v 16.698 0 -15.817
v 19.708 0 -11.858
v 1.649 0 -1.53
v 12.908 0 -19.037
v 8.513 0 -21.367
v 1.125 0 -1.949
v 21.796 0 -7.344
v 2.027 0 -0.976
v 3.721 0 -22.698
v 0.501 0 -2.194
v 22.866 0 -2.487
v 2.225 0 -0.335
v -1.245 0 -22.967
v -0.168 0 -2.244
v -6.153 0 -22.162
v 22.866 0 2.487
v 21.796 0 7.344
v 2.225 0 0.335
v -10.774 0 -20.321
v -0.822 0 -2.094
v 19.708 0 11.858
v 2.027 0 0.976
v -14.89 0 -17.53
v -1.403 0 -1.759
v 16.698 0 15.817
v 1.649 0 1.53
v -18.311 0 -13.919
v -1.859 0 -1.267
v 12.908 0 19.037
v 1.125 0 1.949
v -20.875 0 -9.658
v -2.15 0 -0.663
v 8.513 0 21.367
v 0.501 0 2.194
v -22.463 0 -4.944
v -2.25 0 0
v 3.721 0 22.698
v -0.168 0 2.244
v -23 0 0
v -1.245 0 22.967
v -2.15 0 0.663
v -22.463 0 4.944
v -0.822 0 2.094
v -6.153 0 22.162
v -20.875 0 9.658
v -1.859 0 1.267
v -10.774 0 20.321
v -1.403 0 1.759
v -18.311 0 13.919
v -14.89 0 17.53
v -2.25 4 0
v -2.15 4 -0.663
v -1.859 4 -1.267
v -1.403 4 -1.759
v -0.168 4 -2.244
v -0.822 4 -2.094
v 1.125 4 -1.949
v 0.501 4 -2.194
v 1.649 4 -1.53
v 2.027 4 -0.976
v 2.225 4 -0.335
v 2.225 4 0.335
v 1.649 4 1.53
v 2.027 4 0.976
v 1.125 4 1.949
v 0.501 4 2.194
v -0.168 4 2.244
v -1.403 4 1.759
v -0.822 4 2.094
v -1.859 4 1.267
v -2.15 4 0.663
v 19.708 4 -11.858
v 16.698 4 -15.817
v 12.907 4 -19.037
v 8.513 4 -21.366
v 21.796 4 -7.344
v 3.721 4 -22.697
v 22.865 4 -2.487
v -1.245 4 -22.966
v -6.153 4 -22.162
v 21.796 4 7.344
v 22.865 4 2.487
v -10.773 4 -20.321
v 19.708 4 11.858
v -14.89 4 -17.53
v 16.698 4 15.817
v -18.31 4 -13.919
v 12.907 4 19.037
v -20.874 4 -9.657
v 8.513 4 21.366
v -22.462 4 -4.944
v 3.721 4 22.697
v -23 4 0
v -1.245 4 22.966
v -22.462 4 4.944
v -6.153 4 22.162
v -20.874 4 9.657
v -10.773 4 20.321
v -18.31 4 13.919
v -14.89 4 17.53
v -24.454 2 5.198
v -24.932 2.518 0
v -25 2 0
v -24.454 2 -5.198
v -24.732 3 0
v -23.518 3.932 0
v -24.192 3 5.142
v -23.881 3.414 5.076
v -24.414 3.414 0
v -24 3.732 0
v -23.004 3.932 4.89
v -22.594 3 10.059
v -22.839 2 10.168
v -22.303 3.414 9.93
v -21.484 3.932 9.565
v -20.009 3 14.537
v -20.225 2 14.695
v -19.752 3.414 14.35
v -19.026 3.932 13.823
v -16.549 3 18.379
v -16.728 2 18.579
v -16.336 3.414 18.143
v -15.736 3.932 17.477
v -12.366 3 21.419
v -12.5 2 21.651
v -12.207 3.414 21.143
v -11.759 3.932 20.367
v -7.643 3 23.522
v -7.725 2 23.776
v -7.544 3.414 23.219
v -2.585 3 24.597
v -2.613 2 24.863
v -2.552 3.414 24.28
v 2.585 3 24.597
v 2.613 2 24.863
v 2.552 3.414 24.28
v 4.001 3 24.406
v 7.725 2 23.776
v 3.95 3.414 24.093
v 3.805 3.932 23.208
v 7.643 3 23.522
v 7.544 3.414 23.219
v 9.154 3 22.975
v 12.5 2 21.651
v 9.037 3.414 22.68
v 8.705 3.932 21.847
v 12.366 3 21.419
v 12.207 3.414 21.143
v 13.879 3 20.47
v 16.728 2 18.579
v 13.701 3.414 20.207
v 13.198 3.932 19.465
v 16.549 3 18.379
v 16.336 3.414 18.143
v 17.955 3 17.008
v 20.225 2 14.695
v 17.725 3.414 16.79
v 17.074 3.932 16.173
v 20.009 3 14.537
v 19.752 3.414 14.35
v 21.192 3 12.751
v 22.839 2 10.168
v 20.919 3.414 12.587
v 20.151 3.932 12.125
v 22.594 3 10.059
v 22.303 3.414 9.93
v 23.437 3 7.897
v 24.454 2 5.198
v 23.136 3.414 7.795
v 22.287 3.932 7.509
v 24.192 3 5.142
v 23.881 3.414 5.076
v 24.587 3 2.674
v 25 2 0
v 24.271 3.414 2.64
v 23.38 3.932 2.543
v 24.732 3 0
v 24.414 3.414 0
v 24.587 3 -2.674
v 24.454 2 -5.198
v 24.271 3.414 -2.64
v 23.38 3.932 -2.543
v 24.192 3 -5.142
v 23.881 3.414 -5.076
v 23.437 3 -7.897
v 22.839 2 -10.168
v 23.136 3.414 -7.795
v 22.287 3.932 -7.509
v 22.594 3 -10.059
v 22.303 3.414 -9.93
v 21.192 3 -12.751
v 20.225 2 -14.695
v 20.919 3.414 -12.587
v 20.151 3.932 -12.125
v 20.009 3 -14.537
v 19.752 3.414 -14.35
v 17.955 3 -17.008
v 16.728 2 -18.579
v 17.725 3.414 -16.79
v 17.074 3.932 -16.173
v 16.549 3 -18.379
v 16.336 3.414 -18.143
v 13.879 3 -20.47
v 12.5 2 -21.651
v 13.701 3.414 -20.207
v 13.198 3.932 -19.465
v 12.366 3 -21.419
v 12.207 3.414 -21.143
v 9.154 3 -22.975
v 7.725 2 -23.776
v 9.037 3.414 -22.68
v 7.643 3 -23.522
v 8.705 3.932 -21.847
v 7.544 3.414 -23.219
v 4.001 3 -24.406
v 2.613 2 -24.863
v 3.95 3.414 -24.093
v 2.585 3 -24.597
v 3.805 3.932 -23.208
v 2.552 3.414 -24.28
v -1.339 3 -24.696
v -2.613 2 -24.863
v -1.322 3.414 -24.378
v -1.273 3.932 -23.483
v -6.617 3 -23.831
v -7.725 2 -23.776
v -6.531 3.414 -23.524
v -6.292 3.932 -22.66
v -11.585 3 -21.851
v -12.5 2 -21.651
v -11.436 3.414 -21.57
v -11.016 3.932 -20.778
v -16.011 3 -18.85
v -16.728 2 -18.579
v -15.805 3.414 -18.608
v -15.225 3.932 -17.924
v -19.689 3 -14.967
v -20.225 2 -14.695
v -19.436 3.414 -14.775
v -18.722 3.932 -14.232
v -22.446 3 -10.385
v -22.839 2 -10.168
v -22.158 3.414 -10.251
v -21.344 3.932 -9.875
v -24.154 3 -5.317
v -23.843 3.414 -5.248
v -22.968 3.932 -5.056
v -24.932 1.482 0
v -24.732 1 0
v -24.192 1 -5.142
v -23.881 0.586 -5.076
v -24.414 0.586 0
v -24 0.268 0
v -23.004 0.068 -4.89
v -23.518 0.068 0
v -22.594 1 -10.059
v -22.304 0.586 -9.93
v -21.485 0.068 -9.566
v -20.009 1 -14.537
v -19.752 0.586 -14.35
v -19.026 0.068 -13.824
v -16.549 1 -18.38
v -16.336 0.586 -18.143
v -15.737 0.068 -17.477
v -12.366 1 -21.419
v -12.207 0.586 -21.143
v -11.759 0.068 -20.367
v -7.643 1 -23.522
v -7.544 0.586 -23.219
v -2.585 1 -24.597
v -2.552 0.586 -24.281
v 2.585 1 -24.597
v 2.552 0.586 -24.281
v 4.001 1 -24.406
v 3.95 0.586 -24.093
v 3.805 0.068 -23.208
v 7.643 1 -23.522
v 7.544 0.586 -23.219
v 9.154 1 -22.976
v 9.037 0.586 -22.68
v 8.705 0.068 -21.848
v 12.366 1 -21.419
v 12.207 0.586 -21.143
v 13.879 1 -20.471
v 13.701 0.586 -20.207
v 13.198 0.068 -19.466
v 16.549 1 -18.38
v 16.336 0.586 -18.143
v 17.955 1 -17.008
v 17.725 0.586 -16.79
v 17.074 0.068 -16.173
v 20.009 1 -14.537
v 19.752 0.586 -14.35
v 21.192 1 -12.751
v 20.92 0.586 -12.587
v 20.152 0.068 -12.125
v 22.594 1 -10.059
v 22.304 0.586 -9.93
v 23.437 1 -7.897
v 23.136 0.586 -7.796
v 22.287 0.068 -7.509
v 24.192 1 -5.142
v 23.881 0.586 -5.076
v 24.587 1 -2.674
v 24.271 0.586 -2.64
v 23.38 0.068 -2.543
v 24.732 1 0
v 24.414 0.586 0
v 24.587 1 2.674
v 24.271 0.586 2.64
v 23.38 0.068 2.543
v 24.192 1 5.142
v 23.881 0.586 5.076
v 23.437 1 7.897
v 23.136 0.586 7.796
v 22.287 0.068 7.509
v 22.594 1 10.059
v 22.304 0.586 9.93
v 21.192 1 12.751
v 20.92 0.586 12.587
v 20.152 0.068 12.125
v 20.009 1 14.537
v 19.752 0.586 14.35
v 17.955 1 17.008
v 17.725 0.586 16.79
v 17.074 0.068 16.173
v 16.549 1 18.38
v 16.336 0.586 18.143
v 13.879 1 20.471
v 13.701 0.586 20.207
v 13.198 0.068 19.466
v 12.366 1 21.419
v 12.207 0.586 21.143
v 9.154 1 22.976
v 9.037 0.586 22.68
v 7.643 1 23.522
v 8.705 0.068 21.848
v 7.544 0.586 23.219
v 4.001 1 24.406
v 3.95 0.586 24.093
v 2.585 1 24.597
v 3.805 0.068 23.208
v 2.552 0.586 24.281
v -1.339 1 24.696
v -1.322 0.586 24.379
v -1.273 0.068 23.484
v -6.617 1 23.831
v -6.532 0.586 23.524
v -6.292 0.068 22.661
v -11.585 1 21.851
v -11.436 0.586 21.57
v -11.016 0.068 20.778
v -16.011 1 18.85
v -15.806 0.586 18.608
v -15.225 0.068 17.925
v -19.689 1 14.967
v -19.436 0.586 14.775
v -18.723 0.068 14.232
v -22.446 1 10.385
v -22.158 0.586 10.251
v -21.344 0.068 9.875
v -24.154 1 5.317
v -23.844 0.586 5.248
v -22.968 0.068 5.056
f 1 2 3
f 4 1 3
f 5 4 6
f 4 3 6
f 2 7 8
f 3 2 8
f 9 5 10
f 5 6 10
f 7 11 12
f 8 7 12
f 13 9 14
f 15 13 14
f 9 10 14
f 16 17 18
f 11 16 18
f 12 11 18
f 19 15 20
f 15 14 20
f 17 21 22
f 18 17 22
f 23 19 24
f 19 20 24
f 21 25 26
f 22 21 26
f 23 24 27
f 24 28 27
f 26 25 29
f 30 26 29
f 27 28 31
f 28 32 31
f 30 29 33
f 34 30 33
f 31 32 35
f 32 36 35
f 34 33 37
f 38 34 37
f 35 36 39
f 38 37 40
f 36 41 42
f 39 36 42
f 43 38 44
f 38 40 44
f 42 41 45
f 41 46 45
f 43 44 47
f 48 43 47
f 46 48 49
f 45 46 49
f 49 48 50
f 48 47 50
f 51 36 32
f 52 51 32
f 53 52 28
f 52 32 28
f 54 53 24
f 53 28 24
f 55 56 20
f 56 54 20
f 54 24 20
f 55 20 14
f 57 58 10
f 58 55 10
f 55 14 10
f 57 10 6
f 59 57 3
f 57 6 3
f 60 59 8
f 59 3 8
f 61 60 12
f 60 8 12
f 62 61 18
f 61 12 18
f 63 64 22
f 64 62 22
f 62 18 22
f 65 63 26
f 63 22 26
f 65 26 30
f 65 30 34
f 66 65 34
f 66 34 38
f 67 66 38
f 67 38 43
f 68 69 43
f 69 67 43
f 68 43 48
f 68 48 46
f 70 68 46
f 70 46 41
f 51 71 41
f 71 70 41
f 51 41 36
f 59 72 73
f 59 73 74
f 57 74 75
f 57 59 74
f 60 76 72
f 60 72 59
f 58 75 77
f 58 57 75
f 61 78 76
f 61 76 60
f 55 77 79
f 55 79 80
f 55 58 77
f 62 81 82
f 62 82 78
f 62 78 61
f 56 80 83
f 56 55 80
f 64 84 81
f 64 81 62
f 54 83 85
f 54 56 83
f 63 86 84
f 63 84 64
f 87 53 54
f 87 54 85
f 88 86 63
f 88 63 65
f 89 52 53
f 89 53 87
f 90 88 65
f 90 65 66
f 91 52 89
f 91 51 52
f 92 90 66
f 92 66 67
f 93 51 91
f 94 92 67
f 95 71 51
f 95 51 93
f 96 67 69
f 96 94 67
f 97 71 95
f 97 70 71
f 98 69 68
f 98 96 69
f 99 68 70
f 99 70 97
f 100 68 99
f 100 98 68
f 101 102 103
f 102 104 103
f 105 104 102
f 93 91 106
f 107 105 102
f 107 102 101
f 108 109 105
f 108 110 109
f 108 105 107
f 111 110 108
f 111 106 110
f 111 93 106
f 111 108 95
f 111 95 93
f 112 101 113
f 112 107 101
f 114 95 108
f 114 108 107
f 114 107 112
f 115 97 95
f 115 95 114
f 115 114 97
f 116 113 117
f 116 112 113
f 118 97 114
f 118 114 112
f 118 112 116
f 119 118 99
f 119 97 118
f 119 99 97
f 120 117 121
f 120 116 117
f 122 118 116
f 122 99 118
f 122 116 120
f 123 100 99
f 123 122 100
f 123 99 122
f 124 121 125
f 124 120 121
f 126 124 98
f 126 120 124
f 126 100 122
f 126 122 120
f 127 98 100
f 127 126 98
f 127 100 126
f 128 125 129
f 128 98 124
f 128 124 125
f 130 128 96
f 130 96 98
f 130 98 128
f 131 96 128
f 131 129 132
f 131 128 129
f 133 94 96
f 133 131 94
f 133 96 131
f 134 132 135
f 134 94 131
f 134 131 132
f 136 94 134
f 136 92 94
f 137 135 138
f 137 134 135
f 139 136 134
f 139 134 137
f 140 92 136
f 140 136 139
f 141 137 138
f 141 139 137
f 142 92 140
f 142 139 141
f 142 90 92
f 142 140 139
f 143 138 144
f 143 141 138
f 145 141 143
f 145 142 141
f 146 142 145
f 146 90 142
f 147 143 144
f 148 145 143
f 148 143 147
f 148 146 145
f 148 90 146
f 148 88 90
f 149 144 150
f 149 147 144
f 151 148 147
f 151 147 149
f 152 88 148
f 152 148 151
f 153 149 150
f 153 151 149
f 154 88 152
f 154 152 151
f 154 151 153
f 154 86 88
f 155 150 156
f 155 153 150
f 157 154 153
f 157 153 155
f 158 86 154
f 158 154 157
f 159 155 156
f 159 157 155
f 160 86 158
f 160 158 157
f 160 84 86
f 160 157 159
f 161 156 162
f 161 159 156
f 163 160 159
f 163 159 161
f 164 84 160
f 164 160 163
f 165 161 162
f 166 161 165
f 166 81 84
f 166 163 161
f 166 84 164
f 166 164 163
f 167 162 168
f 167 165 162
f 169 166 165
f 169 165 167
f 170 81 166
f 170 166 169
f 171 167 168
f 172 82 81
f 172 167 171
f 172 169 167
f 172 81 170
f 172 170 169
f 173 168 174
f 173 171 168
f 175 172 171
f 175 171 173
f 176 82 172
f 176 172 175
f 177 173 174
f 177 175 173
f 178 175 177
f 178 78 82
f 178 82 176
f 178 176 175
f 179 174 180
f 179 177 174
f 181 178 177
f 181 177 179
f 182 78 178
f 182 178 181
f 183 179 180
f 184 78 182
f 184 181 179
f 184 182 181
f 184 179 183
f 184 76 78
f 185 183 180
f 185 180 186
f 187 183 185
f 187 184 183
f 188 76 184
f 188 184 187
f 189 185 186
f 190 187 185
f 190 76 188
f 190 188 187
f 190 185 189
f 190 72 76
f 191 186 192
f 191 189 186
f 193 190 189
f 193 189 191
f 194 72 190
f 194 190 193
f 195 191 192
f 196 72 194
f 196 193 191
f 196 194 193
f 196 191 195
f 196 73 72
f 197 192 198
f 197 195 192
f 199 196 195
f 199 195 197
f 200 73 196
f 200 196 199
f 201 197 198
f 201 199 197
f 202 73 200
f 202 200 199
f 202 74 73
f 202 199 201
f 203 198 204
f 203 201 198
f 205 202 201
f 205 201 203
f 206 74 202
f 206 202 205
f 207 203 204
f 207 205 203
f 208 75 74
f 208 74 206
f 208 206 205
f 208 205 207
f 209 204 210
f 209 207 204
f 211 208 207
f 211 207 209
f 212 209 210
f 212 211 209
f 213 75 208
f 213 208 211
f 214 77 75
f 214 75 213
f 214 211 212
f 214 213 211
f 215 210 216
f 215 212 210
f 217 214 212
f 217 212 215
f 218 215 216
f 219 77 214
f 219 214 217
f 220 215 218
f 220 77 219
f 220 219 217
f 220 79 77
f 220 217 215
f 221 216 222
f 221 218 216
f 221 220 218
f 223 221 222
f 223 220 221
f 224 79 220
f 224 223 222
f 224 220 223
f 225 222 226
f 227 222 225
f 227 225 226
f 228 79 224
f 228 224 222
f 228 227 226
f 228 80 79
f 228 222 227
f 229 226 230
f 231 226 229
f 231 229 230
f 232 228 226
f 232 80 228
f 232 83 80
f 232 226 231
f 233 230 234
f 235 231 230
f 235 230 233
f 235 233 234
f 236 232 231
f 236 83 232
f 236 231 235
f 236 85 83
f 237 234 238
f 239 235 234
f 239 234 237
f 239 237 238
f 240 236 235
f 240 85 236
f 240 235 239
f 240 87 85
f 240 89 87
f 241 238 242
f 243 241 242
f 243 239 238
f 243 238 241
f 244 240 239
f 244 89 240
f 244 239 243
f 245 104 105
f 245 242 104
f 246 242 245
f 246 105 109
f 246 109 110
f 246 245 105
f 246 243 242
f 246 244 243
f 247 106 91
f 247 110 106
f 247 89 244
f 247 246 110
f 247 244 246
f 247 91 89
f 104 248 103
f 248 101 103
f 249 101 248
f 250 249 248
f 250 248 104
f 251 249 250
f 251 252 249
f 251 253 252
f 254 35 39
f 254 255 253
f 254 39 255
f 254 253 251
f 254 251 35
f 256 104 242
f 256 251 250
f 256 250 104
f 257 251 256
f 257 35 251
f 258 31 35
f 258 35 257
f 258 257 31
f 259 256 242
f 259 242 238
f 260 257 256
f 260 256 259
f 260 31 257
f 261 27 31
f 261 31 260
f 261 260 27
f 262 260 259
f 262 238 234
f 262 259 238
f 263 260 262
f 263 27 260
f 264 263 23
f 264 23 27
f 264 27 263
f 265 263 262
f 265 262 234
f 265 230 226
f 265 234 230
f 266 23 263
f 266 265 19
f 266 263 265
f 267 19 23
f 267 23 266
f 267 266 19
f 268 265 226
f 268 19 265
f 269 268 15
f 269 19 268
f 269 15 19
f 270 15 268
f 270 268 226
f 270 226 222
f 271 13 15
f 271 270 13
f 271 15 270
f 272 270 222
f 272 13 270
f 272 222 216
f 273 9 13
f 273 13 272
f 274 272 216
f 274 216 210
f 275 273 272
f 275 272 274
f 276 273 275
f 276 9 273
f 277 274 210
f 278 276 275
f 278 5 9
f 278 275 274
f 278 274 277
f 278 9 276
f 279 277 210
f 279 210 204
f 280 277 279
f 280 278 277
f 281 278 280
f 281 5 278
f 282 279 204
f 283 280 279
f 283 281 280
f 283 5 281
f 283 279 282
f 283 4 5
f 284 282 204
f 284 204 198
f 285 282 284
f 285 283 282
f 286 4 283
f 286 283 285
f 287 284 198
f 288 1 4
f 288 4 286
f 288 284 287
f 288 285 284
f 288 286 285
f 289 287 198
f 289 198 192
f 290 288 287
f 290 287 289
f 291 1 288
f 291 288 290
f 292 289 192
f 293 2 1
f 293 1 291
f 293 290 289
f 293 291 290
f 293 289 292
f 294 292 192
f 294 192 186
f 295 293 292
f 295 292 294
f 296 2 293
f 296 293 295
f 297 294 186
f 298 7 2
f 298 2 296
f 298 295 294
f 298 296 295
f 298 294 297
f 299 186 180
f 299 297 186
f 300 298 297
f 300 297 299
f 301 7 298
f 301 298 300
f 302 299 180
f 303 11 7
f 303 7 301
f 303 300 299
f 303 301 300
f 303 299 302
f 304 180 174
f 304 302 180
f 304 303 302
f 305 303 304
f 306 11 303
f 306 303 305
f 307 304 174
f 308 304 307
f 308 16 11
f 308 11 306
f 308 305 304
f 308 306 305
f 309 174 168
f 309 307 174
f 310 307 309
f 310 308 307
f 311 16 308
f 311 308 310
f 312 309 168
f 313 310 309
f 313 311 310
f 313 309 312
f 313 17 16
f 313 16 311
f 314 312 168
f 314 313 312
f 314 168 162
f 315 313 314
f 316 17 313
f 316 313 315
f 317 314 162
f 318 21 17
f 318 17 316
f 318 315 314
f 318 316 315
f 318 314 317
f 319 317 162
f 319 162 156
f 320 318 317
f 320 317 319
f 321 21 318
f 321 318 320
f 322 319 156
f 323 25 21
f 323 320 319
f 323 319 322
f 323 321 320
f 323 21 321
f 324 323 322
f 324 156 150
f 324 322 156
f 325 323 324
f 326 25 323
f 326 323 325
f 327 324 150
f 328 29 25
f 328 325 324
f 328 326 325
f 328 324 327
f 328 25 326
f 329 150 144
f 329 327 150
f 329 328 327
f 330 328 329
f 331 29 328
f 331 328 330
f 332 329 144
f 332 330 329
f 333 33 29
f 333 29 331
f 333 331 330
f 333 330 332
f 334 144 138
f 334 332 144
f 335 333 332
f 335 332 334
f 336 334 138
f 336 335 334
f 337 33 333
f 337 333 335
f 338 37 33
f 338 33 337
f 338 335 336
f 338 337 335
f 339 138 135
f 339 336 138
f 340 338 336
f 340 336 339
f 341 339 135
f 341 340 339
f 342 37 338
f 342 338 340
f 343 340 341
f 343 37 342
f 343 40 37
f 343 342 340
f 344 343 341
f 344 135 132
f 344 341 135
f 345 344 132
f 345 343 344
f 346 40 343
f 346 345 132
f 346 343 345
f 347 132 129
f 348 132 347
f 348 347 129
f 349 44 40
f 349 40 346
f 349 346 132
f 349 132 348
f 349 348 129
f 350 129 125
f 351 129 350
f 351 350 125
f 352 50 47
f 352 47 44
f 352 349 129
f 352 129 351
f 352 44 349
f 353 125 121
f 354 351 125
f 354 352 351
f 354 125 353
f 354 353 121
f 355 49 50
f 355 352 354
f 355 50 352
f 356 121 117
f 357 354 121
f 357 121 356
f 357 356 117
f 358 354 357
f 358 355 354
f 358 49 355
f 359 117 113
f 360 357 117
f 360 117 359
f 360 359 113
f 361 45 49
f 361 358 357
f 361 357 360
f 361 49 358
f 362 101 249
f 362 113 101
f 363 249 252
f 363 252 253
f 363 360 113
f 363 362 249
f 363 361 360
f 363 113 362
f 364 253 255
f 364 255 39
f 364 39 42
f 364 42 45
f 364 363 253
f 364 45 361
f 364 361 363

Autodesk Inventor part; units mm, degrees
ref_plane "YZ Plane" through (0, 0, 0) normal (1, 0, 0) x (0, 1, 0)
ref_plane "XZ Plane" through (0, 0, 0) normal (0, 1, 0) x (-1, 0, 0)
ref_plane "XY Plane" through (0, 0, 0) normal (0, 0, 1) x (1, 0, 0)
sketch "Sketch1" plane through (0, 0, 0) normal (0, 1, 0) x (-1, 0, 0)
  circle A0 centre (0, 0) radius 25
  circle A1 centre (0, 0) radius 2.25
  dimension "d0" = 50
  dimension "d1" = 4.5
extrude "Extrusion1" add sketch "Sketch1" along normal blind 4
fillet "Fillet1" radius 2 1 edges at (25, 4, 0)
fillet "Fillet2" radius 2 1 edges at (25, 0, 0)
properties part number "Rotor"
